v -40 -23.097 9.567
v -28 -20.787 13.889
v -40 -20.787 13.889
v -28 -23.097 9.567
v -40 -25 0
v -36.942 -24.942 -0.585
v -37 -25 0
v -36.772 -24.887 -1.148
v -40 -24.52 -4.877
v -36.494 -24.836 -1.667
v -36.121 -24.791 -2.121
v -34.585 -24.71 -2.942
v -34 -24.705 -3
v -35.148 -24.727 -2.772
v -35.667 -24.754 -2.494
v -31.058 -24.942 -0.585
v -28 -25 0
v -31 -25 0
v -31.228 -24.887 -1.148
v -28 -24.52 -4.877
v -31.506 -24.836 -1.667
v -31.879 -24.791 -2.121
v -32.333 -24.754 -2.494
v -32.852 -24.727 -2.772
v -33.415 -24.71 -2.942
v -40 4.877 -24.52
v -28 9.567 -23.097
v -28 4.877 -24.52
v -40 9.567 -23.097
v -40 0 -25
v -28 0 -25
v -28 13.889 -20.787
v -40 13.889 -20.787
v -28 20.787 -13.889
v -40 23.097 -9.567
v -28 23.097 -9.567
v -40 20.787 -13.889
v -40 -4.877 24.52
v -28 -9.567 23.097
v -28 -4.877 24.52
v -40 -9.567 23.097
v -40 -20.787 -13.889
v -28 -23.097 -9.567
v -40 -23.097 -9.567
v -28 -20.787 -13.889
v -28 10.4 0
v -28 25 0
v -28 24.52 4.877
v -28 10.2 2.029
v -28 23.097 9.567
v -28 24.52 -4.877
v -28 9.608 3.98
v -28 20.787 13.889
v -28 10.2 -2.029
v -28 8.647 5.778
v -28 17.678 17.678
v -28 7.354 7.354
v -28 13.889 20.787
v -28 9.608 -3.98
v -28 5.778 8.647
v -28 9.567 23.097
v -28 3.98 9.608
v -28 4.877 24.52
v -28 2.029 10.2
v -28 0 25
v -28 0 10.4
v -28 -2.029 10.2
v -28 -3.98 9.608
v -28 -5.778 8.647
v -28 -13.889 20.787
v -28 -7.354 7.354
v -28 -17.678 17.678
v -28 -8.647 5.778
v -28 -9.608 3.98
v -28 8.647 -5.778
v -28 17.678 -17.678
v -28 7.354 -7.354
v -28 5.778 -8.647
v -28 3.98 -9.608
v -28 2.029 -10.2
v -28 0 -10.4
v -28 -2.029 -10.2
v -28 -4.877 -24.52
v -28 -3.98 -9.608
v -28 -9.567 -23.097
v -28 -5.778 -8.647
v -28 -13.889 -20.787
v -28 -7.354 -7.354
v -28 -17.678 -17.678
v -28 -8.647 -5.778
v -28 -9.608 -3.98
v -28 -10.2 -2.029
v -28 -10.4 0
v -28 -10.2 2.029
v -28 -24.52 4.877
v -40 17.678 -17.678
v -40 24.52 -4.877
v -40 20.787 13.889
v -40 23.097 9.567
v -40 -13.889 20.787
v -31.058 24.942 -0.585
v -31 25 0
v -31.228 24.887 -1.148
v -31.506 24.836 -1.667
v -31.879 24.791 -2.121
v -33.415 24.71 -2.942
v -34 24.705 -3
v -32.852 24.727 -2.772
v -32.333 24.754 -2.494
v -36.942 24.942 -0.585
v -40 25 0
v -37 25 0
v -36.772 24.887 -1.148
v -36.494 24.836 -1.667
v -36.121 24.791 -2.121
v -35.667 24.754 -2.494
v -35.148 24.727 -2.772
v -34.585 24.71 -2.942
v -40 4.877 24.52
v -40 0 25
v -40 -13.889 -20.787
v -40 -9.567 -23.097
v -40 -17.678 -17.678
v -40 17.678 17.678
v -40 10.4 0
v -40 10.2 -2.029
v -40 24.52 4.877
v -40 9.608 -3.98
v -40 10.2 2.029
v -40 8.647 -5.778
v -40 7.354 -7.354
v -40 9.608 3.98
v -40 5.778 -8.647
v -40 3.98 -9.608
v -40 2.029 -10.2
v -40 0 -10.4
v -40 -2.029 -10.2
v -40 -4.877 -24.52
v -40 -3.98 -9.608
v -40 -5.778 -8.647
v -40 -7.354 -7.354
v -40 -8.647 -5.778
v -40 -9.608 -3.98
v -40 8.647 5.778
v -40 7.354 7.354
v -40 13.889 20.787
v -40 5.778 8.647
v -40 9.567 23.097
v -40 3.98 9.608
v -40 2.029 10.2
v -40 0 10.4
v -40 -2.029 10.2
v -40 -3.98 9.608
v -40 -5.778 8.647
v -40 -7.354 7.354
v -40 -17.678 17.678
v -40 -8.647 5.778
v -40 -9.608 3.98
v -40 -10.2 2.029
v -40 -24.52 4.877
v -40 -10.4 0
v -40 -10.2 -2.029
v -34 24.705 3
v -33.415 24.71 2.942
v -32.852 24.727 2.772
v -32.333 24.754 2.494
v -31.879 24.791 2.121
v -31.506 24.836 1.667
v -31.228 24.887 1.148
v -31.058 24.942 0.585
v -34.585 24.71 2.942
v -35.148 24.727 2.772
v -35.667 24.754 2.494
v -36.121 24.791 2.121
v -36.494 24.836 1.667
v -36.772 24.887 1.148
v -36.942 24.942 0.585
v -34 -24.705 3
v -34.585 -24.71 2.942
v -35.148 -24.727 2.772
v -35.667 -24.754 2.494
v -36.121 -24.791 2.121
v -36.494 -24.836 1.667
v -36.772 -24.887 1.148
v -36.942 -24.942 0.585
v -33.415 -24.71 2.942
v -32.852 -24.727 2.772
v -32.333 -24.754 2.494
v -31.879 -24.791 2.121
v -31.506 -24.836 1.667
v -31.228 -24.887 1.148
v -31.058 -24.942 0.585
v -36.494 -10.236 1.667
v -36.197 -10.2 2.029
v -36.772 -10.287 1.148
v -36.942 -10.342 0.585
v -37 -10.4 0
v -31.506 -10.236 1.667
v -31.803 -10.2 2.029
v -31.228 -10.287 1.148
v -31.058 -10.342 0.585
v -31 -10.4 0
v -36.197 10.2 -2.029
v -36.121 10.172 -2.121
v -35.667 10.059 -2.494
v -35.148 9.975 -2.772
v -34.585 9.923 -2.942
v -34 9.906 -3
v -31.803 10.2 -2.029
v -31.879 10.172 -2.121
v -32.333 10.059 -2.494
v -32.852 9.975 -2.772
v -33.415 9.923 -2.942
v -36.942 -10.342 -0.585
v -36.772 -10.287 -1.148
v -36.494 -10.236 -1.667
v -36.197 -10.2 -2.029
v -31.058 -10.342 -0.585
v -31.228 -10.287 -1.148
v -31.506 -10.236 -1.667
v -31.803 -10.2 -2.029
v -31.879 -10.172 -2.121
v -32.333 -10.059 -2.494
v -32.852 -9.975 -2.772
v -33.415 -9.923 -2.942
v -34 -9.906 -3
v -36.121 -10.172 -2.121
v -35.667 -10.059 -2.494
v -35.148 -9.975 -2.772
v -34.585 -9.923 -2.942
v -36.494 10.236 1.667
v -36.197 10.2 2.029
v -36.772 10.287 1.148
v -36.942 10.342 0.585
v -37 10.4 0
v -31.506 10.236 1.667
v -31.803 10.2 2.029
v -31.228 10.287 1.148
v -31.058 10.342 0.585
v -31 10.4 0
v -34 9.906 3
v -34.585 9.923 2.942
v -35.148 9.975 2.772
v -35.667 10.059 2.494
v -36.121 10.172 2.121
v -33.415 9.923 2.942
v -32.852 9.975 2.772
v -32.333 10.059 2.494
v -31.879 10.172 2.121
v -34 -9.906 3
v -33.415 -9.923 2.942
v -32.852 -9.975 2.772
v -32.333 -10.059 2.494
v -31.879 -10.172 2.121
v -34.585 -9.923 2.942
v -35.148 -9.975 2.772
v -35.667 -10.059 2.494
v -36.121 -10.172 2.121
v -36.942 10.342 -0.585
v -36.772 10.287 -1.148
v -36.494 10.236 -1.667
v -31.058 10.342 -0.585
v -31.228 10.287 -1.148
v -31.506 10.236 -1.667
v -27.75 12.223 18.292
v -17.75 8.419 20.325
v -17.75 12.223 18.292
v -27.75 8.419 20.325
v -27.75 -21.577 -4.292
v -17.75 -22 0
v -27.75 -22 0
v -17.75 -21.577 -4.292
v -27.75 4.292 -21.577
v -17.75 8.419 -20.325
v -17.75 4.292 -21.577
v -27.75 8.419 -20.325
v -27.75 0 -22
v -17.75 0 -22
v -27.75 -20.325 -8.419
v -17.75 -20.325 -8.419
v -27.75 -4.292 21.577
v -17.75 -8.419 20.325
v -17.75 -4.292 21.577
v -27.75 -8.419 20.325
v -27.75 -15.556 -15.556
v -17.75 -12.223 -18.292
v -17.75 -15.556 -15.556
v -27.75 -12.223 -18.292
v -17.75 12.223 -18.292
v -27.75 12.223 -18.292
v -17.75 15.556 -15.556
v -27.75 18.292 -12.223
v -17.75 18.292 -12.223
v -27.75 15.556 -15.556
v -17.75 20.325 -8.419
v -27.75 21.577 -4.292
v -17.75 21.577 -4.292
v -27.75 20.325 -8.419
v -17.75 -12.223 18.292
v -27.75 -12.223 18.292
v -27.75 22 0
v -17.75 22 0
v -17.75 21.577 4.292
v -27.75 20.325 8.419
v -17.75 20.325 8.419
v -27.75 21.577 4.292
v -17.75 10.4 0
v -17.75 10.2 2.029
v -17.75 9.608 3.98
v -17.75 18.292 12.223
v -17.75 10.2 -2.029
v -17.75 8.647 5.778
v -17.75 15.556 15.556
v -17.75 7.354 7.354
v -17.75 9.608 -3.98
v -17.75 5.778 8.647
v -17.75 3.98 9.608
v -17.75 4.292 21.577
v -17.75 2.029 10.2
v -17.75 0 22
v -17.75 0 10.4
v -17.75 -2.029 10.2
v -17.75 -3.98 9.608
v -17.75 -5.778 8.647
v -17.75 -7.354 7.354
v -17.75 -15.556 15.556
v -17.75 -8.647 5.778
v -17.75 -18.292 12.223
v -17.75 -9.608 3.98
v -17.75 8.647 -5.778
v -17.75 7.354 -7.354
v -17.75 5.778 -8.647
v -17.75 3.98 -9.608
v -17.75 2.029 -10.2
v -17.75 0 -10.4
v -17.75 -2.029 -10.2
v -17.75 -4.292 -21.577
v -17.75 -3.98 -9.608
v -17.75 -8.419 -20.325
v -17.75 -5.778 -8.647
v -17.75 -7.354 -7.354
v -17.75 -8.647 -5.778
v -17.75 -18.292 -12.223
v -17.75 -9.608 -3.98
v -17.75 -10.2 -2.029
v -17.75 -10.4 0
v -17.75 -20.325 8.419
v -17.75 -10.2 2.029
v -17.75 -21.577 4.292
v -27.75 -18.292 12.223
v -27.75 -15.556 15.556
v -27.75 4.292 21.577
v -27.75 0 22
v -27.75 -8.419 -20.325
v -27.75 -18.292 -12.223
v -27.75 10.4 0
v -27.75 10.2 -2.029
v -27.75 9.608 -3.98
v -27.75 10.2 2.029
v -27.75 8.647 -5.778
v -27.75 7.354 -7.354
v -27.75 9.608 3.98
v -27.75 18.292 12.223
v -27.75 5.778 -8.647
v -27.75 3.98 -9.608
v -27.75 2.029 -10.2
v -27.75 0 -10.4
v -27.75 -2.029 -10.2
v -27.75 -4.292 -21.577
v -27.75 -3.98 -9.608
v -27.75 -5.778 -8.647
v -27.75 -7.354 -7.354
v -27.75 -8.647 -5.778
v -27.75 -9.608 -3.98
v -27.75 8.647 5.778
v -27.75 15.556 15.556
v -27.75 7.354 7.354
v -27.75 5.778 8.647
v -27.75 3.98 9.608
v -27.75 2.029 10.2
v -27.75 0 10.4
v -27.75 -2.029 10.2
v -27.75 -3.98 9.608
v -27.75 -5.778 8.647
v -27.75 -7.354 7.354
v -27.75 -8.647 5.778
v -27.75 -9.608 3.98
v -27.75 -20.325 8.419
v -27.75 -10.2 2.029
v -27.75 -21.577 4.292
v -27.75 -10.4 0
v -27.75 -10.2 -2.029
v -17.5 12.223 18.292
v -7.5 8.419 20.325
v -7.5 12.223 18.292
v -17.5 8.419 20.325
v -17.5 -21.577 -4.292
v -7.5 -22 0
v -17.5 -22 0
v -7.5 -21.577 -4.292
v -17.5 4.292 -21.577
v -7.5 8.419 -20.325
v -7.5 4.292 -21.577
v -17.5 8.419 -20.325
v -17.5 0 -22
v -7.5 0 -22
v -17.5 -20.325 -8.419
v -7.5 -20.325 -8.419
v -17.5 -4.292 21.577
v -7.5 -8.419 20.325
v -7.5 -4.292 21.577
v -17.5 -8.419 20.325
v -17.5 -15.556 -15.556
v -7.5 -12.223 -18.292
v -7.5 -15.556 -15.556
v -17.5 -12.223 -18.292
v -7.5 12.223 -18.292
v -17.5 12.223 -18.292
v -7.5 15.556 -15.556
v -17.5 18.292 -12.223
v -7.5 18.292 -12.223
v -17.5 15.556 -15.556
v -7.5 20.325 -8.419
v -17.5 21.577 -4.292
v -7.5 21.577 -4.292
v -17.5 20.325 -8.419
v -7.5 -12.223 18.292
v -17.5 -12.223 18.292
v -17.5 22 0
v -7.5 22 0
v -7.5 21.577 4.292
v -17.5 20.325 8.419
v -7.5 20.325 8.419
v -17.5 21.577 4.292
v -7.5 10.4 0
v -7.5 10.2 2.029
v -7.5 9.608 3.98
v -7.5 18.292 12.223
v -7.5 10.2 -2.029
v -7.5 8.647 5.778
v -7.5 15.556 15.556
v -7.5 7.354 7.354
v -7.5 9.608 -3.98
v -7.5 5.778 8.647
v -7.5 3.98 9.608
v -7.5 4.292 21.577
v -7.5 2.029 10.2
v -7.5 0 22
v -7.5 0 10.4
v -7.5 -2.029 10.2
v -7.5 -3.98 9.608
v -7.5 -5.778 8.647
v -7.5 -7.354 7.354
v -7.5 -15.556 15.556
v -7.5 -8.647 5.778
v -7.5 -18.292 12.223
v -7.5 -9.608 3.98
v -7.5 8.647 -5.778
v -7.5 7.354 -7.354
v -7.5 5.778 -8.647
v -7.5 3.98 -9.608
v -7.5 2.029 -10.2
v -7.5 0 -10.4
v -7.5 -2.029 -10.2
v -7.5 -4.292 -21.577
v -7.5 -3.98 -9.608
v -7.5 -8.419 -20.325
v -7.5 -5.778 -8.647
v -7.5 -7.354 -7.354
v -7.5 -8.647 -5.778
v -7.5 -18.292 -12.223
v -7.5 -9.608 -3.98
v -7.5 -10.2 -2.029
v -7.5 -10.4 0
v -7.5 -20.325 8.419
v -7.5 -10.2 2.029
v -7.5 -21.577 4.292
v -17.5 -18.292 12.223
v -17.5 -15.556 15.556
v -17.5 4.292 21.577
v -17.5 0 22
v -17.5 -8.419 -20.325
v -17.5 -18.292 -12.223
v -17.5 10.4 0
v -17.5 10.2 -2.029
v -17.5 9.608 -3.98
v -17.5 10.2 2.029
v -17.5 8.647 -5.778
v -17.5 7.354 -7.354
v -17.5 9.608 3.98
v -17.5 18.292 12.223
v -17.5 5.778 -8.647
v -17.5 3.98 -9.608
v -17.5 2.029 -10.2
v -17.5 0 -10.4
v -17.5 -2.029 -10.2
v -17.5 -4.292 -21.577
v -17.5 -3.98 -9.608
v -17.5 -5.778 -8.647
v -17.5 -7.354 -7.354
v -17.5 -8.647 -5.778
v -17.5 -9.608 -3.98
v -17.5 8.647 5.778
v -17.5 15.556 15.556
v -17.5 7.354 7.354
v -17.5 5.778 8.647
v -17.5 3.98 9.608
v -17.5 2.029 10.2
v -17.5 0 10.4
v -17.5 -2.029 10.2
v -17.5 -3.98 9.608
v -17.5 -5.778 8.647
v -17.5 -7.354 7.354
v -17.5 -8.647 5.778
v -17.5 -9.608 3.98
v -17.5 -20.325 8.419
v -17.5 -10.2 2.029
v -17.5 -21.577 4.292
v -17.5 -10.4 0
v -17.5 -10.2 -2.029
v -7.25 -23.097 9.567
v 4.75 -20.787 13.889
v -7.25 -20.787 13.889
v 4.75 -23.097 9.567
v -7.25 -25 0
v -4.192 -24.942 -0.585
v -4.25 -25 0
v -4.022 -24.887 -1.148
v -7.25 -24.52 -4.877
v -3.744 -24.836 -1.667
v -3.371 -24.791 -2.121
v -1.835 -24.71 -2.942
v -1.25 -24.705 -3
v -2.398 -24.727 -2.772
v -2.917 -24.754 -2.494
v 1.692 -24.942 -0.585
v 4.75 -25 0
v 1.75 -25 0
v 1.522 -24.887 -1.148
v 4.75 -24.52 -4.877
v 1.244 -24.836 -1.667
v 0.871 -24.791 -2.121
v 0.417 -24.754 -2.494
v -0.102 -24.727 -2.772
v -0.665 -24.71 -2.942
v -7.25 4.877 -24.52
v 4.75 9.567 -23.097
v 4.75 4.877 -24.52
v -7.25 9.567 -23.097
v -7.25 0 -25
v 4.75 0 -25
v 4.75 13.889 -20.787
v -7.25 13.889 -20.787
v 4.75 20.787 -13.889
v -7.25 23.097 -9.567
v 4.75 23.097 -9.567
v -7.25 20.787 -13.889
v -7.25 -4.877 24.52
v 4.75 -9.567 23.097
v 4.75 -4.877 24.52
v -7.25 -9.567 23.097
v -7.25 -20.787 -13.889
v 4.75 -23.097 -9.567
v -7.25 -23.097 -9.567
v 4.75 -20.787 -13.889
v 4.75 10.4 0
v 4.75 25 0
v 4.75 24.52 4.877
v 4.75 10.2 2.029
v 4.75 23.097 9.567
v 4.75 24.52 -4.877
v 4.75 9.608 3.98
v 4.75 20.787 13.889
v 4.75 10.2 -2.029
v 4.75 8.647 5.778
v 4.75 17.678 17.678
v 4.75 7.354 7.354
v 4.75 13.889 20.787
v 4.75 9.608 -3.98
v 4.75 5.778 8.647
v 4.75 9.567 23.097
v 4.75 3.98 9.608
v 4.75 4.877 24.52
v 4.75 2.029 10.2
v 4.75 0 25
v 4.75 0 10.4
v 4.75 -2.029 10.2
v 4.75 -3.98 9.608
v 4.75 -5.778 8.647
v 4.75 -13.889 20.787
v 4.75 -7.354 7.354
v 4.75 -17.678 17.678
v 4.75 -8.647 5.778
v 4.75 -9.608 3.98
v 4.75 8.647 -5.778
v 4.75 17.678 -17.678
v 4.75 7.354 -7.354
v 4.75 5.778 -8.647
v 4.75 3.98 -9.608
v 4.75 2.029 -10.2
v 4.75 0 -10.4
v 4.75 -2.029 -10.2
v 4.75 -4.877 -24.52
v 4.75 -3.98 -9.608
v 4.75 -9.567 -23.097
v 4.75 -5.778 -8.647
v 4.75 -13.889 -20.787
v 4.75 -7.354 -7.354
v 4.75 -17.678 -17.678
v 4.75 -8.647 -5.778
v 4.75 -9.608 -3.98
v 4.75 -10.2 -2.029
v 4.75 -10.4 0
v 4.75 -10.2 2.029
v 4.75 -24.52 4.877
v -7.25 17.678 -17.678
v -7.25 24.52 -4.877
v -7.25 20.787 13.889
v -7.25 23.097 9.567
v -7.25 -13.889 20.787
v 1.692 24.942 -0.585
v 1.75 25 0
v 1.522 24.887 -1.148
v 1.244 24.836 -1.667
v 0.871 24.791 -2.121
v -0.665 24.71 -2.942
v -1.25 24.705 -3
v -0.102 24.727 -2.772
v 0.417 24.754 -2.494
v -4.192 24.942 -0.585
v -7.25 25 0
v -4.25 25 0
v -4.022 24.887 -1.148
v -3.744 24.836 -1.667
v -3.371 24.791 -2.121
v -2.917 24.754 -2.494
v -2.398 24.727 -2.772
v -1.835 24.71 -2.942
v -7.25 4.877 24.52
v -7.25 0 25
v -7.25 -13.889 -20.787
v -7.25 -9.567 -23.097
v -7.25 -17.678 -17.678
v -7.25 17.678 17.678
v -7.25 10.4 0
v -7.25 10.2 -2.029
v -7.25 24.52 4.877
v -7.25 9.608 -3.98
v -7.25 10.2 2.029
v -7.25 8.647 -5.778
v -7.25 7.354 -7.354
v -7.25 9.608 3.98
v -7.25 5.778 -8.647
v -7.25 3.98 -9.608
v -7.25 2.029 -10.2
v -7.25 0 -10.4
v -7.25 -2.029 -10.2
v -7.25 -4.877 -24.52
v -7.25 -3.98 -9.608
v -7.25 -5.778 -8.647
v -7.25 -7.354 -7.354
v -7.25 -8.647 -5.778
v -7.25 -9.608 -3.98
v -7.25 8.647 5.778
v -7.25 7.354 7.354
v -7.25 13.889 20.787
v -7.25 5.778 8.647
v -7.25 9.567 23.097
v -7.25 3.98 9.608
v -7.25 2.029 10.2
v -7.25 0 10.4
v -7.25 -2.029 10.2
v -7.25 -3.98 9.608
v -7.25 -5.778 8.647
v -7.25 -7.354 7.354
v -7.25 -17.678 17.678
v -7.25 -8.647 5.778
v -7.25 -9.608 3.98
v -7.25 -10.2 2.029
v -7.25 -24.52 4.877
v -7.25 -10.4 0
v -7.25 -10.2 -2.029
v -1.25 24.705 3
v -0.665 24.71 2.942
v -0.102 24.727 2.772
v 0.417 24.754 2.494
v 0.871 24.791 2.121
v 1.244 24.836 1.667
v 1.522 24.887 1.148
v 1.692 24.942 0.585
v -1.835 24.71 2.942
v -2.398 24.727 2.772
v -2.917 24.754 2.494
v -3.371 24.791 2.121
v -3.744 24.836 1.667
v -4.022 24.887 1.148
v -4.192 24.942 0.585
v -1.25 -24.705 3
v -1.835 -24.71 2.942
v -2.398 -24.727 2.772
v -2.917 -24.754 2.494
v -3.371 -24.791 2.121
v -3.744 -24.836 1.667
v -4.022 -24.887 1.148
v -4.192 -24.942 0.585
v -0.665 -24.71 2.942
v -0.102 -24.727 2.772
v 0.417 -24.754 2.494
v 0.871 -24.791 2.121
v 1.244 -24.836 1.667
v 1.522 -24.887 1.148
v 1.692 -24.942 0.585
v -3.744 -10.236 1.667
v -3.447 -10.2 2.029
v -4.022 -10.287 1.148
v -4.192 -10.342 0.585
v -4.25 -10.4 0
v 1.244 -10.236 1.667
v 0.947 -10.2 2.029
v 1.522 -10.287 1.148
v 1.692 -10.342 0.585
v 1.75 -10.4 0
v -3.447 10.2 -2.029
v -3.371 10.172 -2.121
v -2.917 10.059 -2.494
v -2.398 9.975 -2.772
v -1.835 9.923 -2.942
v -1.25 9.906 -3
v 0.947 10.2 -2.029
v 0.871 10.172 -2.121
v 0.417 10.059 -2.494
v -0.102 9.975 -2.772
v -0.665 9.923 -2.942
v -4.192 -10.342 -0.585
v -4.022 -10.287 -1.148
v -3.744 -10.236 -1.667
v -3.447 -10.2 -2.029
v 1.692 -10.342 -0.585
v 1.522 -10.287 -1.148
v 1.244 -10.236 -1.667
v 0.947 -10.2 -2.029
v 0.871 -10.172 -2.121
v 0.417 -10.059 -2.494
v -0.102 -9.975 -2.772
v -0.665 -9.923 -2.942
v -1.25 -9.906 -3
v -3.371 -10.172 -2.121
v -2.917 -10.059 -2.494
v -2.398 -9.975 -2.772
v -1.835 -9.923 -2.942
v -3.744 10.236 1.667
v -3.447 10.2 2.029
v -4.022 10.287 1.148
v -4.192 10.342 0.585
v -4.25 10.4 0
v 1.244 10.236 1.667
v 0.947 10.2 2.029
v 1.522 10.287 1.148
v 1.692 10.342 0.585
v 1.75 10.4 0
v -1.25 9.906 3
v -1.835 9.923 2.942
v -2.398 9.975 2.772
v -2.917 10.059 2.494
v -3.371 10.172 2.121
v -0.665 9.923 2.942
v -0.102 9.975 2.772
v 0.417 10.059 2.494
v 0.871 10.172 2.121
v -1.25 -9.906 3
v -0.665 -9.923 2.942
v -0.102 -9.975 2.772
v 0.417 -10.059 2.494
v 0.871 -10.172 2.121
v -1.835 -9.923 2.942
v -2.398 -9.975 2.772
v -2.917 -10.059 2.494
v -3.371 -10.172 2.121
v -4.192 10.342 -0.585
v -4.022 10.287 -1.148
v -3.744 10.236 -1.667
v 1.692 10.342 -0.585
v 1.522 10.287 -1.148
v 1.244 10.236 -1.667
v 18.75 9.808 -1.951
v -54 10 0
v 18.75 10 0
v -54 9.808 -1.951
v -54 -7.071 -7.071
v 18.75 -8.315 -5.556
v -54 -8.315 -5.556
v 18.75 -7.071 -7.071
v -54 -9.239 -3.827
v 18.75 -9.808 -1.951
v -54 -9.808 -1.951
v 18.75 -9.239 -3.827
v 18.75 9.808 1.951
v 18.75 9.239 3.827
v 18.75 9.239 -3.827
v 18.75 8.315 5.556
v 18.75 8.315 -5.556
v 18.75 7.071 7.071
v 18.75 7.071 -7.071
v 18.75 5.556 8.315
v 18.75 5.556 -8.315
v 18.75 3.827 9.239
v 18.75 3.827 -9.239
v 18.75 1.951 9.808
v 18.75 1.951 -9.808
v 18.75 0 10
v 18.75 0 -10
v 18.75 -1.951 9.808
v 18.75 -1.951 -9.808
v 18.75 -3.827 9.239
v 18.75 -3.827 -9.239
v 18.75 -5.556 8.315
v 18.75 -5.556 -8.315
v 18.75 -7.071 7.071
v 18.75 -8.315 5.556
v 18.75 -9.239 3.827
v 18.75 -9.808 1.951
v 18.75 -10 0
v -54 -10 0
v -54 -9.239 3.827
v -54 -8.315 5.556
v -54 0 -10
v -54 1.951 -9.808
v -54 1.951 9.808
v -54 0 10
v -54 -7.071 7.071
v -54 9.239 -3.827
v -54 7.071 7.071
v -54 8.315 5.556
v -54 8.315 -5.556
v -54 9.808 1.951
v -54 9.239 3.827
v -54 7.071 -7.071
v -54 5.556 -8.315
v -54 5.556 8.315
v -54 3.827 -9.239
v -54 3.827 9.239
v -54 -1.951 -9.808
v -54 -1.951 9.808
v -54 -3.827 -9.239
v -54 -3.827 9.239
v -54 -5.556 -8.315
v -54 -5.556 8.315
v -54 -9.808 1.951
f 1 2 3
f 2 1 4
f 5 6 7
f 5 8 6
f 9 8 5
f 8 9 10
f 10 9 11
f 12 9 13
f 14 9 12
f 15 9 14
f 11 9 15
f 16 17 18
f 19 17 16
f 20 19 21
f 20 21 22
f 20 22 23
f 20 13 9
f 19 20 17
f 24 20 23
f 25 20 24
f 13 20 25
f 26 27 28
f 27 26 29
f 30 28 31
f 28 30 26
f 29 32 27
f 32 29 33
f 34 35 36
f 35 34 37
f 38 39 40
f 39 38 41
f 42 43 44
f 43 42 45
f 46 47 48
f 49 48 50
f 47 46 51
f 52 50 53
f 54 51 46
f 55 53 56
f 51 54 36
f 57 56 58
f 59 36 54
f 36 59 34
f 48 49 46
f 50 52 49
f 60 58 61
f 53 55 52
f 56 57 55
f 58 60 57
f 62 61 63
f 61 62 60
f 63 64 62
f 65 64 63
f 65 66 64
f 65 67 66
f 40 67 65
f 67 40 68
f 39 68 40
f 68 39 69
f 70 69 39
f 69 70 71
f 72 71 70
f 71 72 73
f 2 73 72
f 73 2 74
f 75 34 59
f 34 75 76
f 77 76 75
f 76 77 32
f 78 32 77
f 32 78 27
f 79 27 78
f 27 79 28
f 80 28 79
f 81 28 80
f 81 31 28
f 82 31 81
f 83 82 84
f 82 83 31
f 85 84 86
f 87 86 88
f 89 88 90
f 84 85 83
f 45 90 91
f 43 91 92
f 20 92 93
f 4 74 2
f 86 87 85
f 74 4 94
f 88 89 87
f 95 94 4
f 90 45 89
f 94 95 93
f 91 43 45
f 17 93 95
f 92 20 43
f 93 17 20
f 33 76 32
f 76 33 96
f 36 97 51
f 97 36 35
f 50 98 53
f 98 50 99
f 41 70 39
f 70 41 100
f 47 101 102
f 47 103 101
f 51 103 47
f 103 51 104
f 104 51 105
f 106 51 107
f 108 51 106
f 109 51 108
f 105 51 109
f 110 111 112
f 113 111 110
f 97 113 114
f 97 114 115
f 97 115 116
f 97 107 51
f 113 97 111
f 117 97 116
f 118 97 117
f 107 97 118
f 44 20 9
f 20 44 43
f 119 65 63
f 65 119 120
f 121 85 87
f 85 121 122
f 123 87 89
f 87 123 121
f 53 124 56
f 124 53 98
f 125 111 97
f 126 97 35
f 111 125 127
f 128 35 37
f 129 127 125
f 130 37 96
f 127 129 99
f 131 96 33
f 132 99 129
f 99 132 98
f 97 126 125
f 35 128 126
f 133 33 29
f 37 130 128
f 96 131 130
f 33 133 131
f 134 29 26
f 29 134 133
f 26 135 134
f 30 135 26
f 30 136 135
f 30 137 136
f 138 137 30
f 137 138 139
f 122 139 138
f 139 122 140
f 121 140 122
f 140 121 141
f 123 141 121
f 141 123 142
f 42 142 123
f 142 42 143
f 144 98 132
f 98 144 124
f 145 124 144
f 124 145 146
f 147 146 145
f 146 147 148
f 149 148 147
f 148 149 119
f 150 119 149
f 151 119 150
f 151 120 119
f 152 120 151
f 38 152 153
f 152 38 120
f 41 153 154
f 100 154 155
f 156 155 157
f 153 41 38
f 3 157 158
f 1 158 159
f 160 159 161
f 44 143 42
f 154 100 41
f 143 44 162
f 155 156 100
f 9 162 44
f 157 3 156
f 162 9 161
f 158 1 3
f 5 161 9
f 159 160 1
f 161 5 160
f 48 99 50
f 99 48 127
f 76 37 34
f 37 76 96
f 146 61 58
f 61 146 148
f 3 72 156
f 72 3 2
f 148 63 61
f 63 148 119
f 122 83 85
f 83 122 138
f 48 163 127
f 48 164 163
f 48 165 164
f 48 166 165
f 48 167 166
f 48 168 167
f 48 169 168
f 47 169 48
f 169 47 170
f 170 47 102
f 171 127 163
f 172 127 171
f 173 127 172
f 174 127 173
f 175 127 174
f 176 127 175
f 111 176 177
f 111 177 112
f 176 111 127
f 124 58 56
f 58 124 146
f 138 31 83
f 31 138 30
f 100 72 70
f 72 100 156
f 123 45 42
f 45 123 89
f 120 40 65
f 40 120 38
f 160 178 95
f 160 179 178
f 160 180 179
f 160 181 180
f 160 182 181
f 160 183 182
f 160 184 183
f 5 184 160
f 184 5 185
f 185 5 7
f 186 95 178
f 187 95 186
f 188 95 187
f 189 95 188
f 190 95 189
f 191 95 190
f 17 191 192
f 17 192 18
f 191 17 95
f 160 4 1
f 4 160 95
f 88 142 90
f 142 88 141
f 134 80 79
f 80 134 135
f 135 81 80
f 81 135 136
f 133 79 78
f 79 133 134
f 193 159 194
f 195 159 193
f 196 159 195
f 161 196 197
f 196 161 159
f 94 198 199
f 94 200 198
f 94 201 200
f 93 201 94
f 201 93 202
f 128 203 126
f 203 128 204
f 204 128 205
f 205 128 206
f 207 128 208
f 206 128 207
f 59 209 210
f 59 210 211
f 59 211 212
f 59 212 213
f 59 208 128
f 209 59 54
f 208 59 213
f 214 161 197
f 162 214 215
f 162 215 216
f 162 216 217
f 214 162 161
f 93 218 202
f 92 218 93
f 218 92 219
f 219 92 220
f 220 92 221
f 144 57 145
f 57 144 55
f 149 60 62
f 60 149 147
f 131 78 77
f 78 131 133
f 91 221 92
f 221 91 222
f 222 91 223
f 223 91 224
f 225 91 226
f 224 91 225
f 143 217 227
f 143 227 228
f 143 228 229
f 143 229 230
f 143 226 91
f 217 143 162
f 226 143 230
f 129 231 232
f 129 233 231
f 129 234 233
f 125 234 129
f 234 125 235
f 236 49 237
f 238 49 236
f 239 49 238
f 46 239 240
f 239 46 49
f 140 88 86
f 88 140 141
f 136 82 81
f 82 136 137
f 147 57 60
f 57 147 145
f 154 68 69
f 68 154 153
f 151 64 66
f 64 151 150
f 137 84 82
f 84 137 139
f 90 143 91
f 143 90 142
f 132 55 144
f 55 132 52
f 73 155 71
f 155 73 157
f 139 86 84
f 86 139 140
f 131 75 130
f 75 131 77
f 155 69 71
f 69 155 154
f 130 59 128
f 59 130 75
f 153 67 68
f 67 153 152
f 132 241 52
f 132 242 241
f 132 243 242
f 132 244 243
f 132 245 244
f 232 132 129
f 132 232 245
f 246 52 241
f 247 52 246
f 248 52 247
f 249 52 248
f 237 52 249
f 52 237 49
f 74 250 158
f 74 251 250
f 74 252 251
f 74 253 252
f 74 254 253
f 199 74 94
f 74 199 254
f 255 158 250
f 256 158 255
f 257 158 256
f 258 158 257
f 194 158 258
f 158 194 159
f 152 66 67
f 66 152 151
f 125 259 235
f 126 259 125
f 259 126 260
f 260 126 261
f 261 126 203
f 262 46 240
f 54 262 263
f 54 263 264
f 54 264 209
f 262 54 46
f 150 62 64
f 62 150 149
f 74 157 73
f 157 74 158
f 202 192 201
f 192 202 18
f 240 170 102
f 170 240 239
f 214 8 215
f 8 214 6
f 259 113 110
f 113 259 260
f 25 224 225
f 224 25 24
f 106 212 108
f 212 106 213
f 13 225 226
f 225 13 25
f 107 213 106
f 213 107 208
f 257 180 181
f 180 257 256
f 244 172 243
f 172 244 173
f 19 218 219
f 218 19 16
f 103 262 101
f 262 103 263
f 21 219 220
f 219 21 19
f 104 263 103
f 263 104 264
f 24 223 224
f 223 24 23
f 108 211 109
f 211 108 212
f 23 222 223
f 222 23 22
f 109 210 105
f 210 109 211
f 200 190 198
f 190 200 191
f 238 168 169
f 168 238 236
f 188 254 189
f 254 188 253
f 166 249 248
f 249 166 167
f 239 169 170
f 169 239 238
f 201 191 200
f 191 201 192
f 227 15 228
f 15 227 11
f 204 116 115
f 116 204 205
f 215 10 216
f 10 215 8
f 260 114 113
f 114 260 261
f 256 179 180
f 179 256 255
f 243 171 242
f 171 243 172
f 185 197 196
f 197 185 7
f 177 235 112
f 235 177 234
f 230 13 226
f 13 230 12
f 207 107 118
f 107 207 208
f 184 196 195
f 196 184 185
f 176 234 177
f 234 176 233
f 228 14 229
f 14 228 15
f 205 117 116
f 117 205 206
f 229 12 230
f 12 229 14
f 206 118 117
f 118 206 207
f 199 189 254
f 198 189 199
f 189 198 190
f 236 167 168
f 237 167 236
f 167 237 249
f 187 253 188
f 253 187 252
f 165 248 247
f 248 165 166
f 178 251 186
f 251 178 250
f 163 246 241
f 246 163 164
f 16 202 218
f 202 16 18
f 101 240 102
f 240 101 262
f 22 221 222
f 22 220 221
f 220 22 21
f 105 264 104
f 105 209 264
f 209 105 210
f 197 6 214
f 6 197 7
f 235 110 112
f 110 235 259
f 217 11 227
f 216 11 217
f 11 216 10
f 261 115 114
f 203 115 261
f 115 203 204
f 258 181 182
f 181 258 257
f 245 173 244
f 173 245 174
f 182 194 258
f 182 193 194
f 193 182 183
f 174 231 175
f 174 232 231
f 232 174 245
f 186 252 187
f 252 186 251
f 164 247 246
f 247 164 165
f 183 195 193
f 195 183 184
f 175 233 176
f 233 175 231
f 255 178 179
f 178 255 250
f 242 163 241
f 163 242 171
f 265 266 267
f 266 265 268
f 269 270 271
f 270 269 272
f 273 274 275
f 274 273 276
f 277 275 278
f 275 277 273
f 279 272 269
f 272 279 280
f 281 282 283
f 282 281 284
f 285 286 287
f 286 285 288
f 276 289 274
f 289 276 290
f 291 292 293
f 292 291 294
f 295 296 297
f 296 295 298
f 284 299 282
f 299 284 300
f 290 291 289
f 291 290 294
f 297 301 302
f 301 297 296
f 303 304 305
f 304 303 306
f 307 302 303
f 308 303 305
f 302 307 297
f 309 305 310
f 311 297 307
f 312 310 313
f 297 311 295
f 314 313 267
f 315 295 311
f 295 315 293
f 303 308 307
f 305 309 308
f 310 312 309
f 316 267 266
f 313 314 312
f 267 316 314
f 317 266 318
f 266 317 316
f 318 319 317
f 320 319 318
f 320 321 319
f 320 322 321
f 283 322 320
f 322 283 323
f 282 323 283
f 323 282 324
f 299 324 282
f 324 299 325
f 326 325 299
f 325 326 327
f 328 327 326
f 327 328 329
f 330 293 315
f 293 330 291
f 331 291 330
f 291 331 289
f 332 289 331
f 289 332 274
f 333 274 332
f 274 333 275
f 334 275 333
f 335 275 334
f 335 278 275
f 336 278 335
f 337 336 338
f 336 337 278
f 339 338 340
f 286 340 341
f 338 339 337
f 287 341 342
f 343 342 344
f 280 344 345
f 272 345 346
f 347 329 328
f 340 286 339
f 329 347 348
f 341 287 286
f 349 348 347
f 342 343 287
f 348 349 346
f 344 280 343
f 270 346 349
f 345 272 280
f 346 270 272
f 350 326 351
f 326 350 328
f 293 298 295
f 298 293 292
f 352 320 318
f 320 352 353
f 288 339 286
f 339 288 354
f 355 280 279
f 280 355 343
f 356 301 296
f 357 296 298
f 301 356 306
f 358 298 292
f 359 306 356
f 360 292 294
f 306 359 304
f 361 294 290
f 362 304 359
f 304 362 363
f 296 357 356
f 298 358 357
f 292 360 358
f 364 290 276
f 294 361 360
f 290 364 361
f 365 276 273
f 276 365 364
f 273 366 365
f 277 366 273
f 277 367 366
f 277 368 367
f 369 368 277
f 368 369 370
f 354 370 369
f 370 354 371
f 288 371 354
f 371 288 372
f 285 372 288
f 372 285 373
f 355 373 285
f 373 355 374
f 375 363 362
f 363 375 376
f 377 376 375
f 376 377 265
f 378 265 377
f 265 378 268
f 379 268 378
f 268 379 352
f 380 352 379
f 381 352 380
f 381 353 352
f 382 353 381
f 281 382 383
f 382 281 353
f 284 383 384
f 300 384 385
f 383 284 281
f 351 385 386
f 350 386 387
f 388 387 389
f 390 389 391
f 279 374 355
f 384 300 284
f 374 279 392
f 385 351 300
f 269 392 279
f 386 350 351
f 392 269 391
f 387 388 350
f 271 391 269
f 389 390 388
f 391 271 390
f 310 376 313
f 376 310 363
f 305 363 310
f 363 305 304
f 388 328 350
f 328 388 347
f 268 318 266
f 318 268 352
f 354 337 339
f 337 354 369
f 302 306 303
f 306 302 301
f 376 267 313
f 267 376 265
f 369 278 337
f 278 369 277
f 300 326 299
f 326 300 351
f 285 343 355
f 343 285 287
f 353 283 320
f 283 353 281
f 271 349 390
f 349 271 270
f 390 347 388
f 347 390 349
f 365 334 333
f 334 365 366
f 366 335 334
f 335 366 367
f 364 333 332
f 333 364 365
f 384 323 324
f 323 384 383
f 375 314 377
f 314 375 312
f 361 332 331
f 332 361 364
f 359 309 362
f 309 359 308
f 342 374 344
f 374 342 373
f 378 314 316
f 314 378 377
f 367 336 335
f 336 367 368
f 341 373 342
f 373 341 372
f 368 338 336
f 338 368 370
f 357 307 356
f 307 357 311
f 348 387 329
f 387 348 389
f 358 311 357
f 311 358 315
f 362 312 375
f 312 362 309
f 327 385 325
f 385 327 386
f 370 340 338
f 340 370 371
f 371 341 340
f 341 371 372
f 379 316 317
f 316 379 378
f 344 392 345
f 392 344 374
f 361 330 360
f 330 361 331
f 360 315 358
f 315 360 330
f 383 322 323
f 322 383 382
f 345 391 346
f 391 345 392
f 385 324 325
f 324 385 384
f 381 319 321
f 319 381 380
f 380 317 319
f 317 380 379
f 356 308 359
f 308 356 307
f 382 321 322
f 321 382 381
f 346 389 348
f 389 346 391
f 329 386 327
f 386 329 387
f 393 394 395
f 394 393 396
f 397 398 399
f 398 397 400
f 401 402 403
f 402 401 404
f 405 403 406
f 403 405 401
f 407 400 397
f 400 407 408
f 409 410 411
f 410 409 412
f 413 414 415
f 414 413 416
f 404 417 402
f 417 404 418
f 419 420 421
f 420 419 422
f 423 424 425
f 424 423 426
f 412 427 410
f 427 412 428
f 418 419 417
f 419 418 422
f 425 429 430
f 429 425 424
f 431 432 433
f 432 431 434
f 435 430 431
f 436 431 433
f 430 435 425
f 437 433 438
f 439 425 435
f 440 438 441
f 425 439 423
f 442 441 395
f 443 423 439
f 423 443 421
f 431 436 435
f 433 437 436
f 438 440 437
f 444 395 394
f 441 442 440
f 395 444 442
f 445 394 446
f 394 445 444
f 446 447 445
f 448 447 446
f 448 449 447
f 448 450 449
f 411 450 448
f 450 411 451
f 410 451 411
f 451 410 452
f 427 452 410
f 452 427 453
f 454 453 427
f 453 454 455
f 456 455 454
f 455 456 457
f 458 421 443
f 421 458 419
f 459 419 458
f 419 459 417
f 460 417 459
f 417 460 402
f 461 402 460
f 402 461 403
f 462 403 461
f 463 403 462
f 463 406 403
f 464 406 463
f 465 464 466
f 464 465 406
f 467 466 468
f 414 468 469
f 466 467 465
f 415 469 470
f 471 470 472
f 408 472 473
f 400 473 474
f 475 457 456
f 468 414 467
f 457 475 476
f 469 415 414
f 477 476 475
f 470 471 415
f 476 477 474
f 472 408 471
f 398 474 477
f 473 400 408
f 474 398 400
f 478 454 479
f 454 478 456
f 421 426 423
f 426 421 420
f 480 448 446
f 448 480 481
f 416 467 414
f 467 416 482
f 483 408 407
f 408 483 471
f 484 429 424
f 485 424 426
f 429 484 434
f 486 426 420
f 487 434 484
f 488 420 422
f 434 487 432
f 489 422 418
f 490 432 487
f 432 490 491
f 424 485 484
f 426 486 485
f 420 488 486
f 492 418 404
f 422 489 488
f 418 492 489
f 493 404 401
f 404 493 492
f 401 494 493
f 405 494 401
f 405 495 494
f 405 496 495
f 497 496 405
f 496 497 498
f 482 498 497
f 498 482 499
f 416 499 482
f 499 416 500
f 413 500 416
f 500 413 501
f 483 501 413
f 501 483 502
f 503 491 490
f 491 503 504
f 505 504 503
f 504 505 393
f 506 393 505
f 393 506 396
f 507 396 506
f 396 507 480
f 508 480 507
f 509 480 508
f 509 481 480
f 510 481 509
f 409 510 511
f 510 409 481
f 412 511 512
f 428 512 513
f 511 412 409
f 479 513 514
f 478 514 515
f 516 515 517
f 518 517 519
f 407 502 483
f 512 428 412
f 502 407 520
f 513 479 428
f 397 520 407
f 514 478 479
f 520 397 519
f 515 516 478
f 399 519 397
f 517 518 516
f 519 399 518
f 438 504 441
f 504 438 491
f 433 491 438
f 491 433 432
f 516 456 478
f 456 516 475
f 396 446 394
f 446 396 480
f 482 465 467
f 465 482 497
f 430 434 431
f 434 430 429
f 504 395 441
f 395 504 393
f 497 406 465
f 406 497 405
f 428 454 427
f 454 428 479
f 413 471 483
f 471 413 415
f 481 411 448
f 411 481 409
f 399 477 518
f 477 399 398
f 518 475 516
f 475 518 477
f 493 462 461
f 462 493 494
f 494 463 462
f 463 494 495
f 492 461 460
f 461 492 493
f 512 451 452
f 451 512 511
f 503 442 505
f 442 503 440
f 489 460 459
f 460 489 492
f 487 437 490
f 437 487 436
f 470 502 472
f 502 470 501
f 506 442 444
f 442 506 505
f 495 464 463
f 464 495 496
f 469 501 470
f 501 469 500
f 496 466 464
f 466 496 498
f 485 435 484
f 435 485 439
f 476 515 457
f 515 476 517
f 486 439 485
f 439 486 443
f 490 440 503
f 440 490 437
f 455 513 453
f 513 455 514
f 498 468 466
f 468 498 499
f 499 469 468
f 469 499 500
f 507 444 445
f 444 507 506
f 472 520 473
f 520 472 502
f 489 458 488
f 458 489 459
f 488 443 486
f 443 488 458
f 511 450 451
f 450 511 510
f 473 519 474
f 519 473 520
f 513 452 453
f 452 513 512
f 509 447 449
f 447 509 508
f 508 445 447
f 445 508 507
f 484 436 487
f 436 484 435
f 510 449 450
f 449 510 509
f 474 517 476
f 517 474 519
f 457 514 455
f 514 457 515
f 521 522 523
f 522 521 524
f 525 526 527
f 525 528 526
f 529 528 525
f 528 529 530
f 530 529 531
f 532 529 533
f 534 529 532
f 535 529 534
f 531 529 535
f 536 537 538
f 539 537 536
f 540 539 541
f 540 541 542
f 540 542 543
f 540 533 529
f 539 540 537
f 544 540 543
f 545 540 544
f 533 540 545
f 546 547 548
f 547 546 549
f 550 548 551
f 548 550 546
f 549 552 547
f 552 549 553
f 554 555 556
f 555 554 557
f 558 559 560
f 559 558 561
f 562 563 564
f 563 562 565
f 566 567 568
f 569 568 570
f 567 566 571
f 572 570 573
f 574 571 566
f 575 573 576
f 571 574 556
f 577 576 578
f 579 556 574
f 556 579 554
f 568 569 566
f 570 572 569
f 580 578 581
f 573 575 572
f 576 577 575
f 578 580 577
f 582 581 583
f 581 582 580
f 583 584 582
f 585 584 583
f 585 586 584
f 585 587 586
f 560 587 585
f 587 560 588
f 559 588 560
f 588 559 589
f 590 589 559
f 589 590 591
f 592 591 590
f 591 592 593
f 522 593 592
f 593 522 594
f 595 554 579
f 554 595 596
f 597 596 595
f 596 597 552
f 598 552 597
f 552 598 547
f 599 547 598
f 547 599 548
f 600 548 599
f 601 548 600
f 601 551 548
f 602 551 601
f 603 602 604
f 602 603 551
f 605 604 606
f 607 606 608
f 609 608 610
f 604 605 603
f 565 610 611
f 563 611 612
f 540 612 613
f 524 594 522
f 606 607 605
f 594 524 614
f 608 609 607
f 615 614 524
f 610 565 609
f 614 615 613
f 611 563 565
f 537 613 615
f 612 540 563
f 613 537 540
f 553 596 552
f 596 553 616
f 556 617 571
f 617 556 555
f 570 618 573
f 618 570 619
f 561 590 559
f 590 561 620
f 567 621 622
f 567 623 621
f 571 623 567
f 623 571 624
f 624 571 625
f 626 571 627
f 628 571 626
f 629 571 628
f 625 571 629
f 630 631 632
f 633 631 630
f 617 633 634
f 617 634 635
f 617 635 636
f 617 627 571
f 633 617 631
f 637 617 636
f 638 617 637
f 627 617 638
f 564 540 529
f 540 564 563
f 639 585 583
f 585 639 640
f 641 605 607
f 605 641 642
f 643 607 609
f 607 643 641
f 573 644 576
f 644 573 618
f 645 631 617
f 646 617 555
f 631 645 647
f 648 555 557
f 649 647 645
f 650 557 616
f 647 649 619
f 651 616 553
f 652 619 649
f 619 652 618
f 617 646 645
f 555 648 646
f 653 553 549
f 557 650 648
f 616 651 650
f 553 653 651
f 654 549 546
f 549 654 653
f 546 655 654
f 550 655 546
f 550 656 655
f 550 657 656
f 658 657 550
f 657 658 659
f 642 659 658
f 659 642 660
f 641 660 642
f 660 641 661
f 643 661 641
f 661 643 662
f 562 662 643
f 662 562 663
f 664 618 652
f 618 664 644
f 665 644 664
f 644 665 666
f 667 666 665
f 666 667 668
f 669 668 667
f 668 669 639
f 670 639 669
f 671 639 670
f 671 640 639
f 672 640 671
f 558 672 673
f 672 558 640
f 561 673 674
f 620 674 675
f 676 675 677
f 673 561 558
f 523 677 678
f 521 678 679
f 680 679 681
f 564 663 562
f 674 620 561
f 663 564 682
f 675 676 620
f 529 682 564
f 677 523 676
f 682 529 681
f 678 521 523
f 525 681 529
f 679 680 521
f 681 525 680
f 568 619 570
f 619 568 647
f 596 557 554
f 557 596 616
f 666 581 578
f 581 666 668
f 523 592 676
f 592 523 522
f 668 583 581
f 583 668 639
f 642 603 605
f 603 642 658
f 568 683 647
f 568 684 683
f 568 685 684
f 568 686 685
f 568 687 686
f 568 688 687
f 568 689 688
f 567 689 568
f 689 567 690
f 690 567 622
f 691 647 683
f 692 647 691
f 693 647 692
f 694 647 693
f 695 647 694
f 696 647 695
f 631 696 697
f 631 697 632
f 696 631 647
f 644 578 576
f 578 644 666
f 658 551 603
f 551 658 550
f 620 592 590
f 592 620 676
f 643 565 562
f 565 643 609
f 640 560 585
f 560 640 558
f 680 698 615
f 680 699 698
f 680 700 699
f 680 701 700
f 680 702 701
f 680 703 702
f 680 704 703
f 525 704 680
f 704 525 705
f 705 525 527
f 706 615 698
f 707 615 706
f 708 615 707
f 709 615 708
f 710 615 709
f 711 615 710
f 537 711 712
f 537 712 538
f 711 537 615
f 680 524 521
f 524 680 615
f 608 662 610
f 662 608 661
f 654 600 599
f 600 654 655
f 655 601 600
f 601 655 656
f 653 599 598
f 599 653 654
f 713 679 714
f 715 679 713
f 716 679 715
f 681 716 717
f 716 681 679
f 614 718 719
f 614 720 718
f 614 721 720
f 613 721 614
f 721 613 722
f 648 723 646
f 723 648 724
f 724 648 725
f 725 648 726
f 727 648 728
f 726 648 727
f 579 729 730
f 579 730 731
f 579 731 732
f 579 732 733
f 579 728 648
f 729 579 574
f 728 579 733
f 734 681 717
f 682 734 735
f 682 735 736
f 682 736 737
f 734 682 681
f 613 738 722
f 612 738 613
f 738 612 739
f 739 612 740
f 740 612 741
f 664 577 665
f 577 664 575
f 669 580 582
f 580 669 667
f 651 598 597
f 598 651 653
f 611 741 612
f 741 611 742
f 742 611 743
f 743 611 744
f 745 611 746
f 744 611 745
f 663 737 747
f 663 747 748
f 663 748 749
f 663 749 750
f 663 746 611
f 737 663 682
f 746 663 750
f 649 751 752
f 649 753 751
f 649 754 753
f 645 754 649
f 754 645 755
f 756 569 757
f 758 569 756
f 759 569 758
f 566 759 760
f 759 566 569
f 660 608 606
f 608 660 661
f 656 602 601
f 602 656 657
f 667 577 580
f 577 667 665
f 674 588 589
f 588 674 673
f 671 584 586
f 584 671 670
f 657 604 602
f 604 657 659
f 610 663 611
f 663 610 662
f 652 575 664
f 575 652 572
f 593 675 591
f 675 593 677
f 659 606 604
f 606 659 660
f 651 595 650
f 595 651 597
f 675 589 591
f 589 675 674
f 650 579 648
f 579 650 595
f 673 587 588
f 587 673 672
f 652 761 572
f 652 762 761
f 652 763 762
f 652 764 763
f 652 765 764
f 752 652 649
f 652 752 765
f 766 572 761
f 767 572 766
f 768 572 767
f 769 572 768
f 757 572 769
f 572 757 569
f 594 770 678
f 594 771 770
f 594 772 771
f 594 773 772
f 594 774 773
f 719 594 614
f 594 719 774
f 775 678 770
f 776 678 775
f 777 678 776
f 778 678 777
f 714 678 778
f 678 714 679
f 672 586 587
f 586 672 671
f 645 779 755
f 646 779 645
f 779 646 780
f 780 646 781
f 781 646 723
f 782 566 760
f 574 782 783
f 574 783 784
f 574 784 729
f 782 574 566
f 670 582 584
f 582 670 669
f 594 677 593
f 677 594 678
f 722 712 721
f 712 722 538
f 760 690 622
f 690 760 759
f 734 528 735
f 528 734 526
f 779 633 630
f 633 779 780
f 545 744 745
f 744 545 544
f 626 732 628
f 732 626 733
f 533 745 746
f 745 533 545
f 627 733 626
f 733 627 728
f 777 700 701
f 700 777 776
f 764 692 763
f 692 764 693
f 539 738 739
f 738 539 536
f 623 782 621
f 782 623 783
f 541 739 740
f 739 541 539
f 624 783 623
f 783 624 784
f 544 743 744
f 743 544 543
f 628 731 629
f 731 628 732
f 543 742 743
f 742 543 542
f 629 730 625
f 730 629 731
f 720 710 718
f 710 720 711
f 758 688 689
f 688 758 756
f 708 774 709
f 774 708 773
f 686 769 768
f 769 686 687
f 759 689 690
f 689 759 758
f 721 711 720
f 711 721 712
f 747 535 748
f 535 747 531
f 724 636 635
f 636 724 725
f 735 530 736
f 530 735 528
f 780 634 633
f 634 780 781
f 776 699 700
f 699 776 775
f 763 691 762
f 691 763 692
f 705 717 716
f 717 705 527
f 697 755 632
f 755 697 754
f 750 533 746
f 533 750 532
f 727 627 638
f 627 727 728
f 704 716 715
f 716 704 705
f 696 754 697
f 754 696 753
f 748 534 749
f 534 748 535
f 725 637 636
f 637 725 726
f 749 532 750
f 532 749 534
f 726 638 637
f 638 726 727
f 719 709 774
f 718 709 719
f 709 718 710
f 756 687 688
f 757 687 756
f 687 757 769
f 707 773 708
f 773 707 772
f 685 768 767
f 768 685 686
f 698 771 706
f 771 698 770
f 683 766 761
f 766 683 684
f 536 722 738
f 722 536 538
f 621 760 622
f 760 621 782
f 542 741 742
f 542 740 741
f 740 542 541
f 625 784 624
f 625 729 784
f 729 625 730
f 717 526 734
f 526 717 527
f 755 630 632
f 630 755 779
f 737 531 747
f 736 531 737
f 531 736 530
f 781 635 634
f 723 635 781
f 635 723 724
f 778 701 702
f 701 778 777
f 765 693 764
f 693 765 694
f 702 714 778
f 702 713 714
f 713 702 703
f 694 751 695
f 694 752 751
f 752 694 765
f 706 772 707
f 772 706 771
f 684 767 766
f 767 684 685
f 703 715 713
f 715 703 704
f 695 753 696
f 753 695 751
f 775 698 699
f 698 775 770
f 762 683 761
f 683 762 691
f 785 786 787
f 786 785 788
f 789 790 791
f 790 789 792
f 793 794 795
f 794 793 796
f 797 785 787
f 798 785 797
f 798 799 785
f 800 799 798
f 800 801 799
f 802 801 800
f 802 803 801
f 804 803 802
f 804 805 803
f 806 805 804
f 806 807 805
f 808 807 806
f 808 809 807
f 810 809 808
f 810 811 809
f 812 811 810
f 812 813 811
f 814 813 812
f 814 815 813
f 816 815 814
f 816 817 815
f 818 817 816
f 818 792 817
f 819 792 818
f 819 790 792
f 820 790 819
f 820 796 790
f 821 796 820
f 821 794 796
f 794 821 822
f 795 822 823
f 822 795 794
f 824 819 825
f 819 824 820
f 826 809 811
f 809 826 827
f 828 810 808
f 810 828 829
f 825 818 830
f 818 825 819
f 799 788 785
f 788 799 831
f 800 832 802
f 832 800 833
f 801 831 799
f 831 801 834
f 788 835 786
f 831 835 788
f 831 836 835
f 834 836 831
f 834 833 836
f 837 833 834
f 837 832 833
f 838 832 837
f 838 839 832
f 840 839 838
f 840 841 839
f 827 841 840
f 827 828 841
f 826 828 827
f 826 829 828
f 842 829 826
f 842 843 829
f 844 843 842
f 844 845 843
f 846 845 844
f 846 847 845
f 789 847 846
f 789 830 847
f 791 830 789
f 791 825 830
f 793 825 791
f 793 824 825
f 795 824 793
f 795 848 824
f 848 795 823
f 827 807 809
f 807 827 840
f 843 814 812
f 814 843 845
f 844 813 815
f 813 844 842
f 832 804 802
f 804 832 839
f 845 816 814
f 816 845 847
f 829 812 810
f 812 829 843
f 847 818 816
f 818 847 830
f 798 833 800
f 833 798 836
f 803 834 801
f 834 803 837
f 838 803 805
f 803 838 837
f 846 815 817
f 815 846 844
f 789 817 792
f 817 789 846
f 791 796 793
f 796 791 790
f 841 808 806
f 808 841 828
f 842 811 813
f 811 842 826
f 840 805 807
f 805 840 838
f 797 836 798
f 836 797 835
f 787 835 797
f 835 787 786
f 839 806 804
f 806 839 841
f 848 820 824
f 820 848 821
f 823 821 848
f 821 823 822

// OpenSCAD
$fn = 32;

// ------------------------------------------------------------------------
// Shaft with rings and collars: d20 shaft, 4 rings
// Every part is its own module, assembly() places them once.
// ------------------------------------------------------------------------

// --- part 1 ---
module shaft() {
  translate([0, 0, -36.375]) cylinder(h = 72.75, d = 20);
}

// --- part 2 ---
module collar_a() {
  difference() {
    cylinder(h = 12, d = 50);
    translate([0, 0, -1]) cylinder(h = 14, d = 20.8);
    translate([0, 0, 6]) rotate([90, 0, 0]) cylinder(h = 52, d = 6, center = true);
  }
}

// --- part 3 ---
module spacer_a() {
  difference() {
      translate([0, 0, 0]) cylinder(h = 10, d = 44);
      translate([0, 0, -1]) cylinder(h = 12, d = 20.8);
    }
}

// --- part 4 ---
module spacer_b() {
  difference() {
      translate([0, 0, 0]) cylinder(h = 10, d = 44);
      translate([0, 0, -1]) cylinder(h = 12, d = 20.8);
    }
}

// --- part 5 ---
module collar_b() {
  difference() {
    cylinder(h = 12, d = 50);
    translate([0, 0, -1]) cylinder(h = 14, d = 20.8);
    translate([0, 0, 6]) rotate([90, 0, 0]) cylinder(h = 52, d = 6, center = true);
  }
}

// --- assembly ---
module assembly() {
  translate([-17.625, 0, 0]) rotate([0, 90, 0]) shaft();
  translate([-40, 0, 0]) rotate([0, 90, 0]) collar_a();
  translate([-27.75, 0, 0]) rotate([0, 90, 0]) spacer_a();
  translate([-17.5, 0, 0]) rotate([0, 90, 0]) spacer_b();
  translate([-7.25, 0, 0]) rotate([0, 90, 0]) collar_b();
}

assembly();
